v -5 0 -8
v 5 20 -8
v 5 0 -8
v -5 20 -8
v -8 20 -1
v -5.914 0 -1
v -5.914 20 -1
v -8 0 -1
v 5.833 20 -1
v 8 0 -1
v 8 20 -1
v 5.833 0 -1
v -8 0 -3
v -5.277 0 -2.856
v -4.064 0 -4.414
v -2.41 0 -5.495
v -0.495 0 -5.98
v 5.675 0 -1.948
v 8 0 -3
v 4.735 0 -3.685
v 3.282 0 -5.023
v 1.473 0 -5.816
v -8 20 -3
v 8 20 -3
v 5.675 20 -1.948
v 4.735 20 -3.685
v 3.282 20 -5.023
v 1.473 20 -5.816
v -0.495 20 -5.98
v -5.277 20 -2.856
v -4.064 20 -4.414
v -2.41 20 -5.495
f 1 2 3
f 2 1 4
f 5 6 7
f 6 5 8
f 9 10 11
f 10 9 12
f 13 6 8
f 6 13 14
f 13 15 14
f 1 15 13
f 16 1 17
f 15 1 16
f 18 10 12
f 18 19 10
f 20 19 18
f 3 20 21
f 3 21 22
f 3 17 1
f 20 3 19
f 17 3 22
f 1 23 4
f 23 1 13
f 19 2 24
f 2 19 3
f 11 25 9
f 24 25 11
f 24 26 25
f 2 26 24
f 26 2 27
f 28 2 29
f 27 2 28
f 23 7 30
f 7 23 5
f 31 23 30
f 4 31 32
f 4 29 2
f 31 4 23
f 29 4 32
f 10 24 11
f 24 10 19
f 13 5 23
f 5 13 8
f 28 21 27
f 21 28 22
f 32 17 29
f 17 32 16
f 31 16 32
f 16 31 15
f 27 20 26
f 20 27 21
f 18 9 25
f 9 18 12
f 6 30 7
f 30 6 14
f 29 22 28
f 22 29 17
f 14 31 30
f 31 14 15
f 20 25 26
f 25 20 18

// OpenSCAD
module topMount() {
    translate([-45,0,0]) topClamp();
    translate([45,0,0])  topClamp();
    translate([-60,0,8]) cube([120,20,2]);
}

module bottomMount() {
    translate([-45,0,0]) bottomClamp();
    translate([45,0,0])  bottomClamp();
}

module topClamp() {
 
    difference() {
        hull() {
            translate([-8,0,0]) cube([16,20,8]);
            translate([-11,0,8]) cube([22,20,2]);
        }
        translate([0,50,0]) rotate([90,0,0]) cylinder(100, d=12);
    }
}

module bottomClamp() {

    difference() {
        hull() {
            translate([-8,0,-3]) cube([16,20,2]);
            translate([-5,0,-8]) cube([10,20,2]);
        }
        translate([0,50,0]) rotate([90,0,0]) cylinder(100, d=12);
    }
}

module rack () {
  color("green") {
    translate([-45,50,0]) rotate([90,0,0]) cylinder(100, d=12);
    translate([45,50,0])  rotate([90,0,0]) cylinder(100, d=12);
  }
}

//topMount();
//bottomMount();

bottomClamp();

//rack();
